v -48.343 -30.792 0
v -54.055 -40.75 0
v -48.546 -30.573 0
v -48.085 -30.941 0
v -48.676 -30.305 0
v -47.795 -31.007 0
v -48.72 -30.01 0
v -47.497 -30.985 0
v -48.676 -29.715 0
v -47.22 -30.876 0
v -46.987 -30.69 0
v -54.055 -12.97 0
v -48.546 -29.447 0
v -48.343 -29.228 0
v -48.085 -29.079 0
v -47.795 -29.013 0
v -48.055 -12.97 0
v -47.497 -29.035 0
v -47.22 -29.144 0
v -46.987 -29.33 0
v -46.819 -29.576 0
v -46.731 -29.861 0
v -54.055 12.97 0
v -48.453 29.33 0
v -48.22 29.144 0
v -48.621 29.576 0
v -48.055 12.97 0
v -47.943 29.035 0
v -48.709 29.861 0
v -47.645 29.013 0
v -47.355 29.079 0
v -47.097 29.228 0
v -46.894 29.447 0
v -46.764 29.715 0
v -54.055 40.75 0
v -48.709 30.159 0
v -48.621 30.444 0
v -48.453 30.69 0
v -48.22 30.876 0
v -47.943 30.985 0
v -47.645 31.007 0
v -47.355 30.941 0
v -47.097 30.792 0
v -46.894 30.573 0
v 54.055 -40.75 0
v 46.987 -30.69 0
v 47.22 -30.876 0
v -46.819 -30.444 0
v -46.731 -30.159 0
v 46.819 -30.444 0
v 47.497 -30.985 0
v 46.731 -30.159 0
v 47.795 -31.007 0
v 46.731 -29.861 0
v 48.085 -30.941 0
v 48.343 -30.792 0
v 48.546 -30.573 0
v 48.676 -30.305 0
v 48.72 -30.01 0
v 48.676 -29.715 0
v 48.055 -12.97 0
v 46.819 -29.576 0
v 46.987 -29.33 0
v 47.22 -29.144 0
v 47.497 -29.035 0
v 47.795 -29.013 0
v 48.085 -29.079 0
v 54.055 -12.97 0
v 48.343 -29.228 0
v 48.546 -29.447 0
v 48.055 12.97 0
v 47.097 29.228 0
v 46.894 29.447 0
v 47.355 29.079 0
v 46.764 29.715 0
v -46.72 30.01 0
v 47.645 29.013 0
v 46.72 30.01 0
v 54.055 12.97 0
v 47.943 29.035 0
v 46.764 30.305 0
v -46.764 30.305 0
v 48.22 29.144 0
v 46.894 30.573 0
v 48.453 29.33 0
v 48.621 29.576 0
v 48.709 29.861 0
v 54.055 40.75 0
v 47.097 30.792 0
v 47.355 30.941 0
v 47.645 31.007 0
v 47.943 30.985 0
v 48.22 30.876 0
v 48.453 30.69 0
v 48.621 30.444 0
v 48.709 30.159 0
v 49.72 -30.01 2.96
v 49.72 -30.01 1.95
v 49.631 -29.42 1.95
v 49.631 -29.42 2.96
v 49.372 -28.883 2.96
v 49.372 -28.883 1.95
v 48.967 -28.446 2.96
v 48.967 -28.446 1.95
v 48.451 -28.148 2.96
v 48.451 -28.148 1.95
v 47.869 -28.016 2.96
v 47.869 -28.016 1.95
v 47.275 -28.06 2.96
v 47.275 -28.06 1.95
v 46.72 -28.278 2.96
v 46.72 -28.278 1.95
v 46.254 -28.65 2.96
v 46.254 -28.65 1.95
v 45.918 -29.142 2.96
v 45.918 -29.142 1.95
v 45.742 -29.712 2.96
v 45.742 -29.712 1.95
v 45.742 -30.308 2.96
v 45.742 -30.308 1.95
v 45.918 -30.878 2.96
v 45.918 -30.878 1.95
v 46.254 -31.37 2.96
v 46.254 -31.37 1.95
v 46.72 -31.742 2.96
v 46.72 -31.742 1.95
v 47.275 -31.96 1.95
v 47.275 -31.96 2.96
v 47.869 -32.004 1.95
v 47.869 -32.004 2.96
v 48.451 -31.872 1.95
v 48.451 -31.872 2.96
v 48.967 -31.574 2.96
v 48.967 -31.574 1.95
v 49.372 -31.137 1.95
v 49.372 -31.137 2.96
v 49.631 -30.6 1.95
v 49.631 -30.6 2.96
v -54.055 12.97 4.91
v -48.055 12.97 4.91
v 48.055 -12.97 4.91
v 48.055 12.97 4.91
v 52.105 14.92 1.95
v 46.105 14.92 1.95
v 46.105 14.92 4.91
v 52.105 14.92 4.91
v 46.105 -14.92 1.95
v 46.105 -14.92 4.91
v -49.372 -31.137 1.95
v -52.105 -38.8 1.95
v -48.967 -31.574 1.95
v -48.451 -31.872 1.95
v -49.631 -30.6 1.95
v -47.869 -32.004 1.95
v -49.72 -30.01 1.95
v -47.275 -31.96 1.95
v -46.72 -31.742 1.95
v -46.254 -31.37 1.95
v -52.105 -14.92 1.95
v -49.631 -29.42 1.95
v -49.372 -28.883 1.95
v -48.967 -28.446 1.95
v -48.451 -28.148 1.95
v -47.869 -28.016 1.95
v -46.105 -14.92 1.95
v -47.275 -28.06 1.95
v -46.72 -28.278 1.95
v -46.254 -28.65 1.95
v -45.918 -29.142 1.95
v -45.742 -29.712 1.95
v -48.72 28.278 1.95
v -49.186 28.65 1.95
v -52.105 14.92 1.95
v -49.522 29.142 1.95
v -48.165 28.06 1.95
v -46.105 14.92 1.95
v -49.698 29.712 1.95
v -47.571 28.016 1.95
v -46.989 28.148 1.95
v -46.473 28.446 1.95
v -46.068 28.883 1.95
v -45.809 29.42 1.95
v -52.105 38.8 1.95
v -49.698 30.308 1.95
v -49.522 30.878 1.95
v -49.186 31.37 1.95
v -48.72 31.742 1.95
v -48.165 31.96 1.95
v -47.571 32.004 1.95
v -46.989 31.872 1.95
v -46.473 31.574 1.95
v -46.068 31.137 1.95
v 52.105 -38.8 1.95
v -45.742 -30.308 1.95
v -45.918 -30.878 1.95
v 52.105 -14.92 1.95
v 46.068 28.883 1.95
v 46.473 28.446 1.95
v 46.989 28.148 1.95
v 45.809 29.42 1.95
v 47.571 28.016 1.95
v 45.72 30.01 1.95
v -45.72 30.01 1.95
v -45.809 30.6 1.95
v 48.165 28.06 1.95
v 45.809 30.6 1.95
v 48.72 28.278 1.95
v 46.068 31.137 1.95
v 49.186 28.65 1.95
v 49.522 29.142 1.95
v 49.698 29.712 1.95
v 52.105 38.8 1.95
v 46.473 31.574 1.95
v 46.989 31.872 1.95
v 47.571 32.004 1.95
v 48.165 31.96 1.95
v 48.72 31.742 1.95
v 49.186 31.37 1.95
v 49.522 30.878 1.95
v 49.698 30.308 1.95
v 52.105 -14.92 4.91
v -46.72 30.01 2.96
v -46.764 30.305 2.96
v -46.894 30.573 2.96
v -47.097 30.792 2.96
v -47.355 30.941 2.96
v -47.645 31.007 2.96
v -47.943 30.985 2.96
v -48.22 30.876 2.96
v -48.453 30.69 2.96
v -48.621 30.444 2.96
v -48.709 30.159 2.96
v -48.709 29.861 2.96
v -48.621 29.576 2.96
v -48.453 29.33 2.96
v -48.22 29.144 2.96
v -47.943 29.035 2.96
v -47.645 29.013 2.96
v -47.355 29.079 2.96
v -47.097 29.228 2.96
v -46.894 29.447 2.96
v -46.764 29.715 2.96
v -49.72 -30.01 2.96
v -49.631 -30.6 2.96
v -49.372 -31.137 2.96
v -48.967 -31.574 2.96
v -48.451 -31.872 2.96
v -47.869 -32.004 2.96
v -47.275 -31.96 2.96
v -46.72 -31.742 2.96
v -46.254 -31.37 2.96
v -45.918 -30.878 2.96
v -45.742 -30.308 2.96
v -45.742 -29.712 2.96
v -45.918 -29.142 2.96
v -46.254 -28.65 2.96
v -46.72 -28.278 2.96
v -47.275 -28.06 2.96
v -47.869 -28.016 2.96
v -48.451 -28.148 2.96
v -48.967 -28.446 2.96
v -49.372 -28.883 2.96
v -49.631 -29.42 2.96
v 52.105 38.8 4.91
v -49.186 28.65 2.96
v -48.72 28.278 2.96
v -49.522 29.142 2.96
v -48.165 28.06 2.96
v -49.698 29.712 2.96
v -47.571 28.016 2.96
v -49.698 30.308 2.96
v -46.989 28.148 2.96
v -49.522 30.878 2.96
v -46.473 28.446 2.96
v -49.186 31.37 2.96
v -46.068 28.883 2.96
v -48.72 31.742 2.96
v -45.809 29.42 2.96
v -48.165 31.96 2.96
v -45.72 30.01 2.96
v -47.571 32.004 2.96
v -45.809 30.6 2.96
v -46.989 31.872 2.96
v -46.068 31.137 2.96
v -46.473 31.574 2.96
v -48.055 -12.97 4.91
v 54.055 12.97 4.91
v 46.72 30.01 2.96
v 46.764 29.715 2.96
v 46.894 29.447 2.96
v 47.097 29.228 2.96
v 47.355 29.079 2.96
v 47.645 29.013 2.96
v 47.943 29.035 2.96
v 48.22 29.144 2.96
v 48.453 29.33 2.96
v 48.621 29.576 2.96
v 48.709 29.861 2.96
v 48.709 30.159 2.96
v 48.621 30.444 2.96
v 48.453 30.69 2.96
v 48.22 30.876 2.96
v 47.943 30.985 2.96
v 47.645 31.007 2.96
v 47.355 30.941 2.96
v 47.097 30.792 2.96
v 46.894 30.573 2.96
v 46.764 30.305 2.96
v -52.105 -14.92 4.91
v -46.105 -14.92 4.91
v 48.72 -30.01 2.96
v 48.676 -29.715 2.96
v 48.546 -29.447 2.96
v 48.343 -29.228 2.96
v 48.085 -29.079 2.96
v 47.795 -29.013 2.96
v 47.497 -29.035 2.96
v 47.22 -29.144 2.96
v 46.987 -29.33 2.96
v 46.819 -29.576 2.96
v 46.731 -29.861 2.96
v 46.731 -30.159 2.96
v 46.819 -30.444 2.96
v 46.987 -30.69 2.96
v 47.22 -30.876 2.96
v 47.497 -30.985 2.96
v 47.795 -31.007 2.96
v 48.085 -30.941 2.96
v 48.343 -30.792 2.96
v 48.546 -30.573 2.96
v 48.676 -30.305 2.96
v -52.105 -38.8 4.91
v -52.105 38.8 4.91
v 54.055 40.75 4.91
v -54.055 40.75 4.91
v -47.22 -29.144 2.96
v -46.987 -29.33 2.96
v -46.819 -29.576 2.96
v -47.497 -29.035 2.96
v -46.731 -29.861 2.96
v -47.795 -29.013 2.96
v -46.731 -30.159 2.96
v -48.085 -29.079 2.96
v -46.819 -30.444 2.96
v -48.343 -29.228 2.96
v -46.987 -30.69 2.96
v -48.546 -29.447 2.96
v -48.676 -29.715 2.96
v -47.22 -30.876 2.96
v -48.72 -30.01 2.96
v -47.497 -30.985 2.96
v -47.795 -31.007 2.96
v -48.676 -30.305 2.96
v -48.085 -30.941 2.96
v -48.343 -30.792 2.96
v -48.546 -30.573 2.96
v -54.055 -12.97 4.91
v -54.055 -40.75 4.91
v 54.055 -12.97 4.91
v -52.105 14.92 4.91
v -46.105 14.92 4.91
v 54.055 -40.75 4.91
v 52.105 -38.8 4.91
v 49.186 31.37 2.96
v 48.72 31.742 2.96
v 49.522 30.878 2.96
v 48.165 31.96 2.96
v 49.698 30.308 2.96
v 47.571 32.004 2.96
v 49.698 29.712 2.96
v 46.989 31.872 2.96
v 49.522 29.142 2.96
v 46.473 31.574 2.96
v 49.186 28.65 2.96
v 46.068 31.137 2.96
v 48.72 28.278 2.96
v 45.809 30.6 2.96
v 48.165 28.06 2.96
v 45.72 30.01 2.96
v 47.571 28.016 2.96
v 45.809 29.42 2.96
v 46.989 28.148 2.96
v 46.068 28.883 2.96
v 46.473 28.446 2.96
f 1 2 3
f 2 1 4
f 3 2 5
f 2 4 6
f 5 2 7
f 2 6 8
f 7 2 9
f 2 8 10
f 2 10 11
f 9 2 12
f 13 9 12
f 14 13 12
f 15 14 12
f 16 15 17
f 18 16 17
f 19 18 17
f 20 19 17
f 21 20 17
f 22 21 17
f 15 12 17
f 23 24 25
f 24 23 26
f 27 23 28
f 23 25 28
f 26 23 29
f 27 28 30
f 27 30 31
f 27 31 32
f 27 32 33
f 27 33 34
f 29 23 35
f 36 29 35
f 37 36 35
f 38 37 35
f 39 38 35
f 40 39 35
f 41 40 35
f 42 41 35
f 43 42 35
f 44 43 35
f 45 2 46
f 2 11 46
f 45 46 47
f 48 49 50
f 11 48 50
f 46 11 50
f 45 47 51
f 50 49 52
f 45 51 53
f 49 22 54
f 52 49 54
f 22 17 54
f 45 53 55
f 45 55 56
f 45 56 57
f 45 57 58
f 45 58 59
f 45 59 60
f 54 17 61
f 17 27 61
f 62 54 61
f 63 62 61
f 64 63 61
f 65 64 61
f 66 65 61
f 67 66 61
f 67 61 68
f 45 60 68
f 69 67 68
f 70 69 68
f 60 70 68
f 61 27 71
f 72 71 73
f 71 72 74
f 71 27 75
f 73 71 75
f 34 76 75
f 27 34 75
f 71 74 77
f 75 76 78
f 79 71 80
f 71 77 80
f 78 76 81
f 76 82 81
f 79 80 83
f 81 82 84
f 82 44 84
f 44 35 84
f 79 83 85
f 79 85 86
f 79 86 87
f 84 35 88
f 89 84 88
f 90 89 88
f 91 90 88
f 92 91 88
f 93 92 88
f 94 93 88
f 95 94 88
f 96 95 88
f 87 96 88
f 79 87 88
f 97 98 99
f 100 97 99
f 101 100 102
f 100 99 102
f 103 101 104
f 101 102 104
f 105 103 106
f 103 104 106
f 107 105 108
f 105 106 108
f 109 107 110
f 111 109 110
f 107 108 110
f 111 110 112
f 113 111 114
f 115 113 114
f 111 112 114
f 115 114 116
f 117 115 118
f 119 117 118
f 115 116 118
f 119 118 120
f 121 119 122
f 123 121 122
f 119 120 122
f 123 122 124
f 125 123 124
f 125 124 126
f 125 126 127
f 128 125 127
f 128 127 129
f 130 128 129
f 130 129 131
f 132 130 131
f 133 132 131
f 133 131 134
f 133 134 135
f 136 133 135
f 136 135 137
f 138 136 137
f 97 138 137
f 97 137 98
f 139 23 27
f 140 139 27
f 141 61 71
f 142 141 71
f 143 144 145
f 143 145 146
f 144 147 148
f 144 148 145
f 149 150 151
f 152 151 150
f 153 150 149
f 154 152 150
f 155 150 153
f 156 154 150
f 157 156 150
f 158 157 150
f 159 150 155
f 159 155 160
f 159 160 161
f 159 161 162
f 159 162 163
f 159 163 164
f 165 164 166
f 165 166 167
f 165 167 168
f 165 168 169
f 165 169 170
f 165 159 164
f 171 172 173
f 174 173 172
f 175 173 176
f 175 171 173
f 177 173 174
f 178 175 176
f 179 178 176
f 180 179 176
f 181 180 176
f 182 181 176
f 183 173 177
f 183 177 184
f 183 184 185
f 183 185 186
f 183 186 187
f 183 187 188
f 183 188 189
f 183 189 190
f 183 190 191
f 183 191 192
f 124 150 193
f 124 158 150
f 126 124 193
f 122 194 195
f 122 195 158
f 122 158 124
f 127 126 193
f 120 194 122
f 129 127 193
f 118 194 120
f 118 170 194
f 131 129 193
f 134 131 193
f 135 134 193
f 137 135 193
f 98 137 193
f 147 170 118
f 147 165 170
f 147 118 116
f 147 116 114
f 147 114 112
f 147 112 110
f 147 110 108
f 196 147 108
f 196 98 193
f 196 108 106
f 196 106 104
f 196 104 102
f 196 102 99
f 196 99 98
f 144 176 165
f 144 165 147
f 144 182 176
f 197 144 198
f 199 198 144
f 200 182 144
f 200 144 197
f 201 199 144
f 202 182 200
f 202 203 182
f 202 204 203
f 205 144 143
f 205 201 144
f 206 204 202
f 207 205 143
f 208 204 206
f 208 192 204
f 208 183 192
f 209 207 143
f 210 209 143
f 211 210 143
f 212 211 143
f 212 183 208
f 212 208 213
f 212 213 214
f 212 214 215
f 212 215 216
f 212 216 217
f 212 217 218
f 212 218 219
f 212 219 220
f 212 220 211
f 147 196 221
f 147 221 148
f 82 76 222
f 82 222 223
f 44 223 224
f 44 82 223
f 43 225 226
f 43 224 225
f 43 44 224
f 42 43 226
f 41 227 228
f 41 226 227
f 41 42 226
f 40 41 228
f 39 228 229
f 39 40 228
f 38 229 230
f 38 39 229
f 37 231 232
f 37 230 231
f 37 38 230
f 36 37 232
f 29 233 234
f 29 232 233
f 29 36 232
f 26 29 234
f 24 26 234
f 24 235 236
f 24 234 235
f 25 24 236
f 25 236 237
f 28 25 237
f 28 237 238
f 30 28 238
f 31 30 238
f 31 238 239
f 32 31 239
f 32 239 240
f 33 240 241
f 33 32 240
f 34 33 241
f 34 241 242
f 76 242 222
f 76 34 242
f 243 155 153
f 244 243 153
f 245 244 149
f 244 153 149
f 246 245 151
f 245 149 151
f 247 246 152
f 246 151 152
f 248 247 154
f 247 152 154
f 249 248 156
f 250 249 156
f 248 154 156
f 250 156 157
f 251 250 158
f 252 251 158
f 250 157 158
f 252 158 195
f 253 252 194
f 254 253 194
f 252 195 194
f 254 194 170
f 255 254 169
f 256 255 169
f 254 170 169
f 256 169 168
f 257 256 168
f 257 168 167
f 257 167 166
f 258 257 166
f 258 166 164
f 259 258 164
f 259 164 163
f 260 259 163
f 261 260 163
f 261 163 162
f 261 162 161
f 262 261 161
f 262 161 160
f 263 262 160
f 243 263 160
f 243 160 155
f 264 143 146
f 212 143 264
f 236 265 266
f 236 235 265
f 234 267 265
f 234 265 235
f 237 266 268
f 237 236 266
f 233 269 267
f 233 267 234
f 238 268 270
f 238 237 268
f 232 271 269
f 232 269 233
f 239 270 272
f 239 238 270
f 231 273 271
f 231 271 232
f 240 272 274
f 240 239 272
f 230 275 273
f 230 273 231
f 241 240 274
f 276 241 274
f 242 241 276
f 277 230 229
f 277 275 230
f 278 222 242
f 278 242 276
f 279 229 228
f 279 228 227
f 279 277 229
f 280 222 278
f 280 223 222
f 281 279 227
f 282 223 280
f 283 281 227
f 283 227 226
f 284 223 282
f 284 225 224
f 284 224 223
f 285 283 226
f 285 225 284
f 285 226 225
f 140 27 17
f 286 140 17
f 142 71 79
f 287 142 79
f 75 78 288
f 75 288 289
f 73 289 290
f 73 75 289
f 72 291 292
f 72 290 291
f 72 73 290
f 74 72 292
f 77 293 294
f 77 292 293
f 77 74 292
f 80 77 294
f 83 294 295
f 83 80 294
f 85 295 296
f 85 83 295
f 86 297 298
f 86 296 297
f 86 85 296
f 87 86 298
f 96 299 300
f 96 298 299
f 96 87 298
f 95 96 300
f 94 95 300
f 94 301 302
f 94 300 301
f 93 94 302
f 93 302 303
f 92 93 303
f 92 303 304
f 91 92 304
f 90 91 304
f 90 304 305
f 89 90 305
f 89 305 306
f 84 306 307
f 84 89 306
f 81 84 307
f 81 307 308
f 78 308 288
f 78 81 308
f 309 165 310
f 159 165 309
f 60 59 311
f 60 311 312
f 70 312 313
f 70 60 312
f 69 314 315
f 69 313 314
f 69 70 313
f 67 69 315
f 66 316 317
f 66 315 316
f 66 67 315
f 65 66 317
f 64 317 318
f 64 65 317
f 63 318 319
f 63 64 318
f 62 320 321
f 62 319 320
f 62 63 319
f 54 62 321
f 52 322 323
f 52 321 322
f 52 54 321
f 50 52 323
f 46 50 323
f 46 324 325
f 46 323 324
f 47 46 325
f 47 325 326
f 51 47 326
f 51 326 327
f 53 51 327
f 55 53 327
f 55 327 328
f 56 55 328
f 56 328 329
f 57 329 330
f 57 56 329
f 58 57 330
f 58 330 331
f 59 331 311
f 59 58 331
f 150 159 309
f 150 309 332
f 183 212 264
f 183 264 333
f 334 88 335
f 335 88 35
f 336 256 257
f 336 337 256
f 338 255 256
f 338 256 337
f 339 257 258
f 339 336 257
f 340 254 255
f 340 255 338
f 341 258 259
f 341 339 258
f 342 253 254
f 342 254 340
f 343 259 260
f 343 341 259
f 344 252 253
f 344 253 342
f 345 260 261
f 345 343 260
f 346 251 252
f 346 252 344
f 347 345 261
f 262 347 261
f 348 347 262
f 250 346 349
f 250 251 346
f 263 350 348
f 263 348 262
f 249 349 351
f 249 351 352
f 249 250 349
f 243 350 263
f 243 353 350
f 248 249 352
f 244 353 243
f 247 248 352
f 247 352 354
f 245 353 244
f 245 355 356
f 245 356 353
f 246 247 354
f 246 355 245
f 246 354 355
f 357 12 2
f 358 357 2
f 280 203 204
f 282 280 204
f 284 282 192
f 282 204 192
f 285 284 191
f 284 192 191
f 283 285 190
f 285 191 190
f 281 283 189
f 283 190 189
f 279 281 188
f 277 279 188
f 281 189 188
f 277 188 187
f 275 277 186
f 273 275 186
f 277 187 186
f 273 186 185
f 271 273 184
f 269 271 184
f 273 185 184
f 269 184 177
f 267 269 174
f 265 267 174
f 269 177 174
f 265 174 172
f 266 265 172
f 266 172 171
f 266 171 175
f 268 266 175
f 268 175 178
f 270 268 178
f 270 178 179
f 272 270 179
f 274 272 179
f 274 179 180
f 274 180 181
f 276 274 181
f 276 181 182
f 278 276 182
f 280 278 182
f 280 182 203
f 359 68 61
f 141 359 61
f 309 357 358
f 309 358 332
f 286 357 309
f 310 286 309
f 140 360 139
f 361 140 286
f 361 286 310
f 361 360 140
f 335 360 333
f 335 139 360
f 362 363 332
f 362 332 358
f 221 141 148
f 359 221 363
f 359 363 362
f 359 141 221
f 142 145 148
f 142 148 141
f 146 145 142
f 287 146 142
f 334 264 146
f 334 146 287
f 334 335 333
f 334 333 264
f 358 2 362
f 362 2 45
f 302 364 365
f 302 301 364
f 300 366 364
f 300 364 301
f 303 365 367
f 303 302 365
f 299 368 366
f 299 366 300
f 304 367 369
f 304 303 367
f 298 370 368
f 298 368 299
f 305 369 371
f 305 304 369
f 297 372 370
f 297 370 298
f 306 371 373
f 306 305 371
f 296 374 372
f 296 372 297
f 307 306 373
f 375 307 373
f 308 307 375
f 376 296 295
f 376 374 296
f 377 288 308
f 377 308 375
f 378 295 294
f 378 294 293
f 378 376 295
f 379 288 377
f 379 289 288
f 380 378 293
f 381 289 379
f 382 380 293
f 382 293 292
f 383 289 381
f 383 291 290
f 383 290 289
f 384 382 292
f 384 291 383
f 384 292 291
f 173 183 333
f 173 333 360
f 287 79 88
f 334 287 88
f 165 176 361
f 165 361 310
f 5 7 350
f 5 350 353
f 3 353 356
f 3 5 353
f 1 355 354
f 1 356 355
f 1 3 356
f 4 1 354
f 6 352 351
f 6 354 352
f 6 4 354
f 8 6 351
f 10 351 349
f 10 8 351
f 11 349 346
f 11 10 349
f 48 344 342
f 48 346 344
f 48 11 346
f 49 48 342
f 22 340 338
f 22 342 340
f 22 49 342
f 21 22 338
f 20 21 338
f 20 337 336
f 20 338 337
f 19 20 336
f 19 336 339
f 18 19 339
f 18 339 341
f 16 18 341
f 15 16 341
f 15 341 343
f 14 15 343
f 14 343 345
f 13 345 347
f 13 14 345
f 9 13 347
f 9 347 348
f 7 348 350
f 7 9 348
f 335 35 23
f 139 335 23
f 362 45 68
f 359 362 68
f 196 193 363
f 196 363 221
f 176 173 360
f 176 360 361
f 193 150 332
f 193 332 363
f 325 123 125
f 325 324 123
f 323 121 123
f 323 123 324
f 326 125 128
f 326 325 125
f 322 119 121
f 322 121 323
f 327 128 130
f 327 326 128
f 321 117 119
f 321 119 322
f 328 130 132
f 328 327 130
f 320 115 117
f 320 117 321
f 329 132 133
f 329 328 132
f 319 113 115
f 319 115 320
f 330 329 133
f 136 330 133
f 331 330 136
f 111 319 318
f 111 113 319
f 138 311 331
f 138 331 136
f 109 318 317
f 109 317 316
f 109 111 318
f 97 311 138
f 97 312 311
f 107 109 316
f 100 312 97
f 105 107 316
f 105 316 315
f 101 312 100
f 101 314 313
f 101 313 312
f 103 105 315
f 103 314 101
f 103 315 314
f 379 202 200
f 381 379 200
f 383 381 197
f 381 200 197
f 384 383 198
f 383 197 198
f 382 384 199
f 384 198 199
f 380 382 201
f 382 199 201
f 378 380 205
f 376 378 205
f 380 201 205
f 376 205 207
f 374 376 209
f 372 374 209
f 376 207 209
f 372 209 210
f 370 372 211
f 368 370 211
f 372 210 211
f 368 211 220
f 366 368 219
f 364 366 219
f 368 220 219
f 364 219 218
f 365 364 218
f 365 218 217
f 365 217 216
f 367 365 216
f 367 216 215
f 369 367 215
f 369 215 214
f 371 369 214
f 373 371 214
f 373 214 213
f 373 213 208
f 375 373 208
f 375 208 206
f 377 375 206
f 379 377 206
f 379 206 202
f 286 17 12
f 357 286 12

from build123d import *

# Parameters (mm, degrees)
SALIENTE_EXTRUIR1_DEPTH    = 4.91
VACIADO1_T                 = -1.95
CROQUIS3_R                 = 2
SALIENTE_EXTRUIR3_DEPTH    = 2.96
CORTAR_EXTRUIR1_DEPTH      = 68.872038609
CORTAR_EXTRUIR1_DEPTH_BACK = 2.96
CROQUIS4_R                 = 1


with BuildPart() as part:
    # Croquis1 → Saliente-Extruir1 (new body)
    with BuildSketch(Plane.XY):
        Polygon((-54.055, -12.97), (-54.055, -40.75), (54.055, -40.75), (54.055, -12.97), (48.055, -12.97), (48.055, 12.97), (54.055, 12.97), (54.055, 40.75), (-54.055, 40.75), (-54.055, 12.97), (-48.055, 12.97), (-48.055, -12.97), align=None)
    extrude(amount=SALIENTE_EXTRUIR1_DEPTH)

    # Vaciado1
    vaciado1_openings = [part.faces().sort_by_distance(p)[0] for p in [
        (0, 0, 4.91),
    ]]
    offset(amount=VACIADO1_T, openings=vaciado1_openings, kind=Kind.INTERSECTION)

    # Croquis3 → Saliente-Extruir3 (add)
    with BuildSketch(Plane.XY):
        with Locations((-47.72, 30.01)):
            Circle(CROQUIS3_R)
        with Locations(Location((47.72, 30.01, 0), (0, 0, 180))):
            Circle(CROQUIS3_R)
        with Locations((47.72, -30.01)):
            Circle(CROQUIS3_R)
        with Locations(Location((-47.72, -30.01, 0), (0, 0, 180))):
            Circle(CROQUIS3_R)
    extrude(amount=SALIENTE_EXTRUIR3_DEPTH)

    # Croquis4 → Cortar-Extruir1 (cut, two sides: drawn at the far end of the back side and taken through both)
    with BuildSketch(Plane.XY.offset(-CORTAR_EXTRUIR1_DEPTH_BACK)):
        with Locations((-47.72, 30.01)):
            Circle(CROQUIS4_R)
        with Locations(Location((47.72, 30.01, 0), (0, 0, 180))):
            Circle(CROQUIS4_R)
        with Locations((47.72, -30.01)):
            Circle(CROQUIS4_R)
        with Locations(Location((-47.72, -30.01, 0), (0, 0, 180))):
            Circle(CROQUIS4_R)
    extrude(amount=CORTAR_EXTRUIR1_DEPTH + CORTAR_EXTRUIR1_DEPTH_BACK, mode=Mode.SUBTRACT)


solid = part.part
